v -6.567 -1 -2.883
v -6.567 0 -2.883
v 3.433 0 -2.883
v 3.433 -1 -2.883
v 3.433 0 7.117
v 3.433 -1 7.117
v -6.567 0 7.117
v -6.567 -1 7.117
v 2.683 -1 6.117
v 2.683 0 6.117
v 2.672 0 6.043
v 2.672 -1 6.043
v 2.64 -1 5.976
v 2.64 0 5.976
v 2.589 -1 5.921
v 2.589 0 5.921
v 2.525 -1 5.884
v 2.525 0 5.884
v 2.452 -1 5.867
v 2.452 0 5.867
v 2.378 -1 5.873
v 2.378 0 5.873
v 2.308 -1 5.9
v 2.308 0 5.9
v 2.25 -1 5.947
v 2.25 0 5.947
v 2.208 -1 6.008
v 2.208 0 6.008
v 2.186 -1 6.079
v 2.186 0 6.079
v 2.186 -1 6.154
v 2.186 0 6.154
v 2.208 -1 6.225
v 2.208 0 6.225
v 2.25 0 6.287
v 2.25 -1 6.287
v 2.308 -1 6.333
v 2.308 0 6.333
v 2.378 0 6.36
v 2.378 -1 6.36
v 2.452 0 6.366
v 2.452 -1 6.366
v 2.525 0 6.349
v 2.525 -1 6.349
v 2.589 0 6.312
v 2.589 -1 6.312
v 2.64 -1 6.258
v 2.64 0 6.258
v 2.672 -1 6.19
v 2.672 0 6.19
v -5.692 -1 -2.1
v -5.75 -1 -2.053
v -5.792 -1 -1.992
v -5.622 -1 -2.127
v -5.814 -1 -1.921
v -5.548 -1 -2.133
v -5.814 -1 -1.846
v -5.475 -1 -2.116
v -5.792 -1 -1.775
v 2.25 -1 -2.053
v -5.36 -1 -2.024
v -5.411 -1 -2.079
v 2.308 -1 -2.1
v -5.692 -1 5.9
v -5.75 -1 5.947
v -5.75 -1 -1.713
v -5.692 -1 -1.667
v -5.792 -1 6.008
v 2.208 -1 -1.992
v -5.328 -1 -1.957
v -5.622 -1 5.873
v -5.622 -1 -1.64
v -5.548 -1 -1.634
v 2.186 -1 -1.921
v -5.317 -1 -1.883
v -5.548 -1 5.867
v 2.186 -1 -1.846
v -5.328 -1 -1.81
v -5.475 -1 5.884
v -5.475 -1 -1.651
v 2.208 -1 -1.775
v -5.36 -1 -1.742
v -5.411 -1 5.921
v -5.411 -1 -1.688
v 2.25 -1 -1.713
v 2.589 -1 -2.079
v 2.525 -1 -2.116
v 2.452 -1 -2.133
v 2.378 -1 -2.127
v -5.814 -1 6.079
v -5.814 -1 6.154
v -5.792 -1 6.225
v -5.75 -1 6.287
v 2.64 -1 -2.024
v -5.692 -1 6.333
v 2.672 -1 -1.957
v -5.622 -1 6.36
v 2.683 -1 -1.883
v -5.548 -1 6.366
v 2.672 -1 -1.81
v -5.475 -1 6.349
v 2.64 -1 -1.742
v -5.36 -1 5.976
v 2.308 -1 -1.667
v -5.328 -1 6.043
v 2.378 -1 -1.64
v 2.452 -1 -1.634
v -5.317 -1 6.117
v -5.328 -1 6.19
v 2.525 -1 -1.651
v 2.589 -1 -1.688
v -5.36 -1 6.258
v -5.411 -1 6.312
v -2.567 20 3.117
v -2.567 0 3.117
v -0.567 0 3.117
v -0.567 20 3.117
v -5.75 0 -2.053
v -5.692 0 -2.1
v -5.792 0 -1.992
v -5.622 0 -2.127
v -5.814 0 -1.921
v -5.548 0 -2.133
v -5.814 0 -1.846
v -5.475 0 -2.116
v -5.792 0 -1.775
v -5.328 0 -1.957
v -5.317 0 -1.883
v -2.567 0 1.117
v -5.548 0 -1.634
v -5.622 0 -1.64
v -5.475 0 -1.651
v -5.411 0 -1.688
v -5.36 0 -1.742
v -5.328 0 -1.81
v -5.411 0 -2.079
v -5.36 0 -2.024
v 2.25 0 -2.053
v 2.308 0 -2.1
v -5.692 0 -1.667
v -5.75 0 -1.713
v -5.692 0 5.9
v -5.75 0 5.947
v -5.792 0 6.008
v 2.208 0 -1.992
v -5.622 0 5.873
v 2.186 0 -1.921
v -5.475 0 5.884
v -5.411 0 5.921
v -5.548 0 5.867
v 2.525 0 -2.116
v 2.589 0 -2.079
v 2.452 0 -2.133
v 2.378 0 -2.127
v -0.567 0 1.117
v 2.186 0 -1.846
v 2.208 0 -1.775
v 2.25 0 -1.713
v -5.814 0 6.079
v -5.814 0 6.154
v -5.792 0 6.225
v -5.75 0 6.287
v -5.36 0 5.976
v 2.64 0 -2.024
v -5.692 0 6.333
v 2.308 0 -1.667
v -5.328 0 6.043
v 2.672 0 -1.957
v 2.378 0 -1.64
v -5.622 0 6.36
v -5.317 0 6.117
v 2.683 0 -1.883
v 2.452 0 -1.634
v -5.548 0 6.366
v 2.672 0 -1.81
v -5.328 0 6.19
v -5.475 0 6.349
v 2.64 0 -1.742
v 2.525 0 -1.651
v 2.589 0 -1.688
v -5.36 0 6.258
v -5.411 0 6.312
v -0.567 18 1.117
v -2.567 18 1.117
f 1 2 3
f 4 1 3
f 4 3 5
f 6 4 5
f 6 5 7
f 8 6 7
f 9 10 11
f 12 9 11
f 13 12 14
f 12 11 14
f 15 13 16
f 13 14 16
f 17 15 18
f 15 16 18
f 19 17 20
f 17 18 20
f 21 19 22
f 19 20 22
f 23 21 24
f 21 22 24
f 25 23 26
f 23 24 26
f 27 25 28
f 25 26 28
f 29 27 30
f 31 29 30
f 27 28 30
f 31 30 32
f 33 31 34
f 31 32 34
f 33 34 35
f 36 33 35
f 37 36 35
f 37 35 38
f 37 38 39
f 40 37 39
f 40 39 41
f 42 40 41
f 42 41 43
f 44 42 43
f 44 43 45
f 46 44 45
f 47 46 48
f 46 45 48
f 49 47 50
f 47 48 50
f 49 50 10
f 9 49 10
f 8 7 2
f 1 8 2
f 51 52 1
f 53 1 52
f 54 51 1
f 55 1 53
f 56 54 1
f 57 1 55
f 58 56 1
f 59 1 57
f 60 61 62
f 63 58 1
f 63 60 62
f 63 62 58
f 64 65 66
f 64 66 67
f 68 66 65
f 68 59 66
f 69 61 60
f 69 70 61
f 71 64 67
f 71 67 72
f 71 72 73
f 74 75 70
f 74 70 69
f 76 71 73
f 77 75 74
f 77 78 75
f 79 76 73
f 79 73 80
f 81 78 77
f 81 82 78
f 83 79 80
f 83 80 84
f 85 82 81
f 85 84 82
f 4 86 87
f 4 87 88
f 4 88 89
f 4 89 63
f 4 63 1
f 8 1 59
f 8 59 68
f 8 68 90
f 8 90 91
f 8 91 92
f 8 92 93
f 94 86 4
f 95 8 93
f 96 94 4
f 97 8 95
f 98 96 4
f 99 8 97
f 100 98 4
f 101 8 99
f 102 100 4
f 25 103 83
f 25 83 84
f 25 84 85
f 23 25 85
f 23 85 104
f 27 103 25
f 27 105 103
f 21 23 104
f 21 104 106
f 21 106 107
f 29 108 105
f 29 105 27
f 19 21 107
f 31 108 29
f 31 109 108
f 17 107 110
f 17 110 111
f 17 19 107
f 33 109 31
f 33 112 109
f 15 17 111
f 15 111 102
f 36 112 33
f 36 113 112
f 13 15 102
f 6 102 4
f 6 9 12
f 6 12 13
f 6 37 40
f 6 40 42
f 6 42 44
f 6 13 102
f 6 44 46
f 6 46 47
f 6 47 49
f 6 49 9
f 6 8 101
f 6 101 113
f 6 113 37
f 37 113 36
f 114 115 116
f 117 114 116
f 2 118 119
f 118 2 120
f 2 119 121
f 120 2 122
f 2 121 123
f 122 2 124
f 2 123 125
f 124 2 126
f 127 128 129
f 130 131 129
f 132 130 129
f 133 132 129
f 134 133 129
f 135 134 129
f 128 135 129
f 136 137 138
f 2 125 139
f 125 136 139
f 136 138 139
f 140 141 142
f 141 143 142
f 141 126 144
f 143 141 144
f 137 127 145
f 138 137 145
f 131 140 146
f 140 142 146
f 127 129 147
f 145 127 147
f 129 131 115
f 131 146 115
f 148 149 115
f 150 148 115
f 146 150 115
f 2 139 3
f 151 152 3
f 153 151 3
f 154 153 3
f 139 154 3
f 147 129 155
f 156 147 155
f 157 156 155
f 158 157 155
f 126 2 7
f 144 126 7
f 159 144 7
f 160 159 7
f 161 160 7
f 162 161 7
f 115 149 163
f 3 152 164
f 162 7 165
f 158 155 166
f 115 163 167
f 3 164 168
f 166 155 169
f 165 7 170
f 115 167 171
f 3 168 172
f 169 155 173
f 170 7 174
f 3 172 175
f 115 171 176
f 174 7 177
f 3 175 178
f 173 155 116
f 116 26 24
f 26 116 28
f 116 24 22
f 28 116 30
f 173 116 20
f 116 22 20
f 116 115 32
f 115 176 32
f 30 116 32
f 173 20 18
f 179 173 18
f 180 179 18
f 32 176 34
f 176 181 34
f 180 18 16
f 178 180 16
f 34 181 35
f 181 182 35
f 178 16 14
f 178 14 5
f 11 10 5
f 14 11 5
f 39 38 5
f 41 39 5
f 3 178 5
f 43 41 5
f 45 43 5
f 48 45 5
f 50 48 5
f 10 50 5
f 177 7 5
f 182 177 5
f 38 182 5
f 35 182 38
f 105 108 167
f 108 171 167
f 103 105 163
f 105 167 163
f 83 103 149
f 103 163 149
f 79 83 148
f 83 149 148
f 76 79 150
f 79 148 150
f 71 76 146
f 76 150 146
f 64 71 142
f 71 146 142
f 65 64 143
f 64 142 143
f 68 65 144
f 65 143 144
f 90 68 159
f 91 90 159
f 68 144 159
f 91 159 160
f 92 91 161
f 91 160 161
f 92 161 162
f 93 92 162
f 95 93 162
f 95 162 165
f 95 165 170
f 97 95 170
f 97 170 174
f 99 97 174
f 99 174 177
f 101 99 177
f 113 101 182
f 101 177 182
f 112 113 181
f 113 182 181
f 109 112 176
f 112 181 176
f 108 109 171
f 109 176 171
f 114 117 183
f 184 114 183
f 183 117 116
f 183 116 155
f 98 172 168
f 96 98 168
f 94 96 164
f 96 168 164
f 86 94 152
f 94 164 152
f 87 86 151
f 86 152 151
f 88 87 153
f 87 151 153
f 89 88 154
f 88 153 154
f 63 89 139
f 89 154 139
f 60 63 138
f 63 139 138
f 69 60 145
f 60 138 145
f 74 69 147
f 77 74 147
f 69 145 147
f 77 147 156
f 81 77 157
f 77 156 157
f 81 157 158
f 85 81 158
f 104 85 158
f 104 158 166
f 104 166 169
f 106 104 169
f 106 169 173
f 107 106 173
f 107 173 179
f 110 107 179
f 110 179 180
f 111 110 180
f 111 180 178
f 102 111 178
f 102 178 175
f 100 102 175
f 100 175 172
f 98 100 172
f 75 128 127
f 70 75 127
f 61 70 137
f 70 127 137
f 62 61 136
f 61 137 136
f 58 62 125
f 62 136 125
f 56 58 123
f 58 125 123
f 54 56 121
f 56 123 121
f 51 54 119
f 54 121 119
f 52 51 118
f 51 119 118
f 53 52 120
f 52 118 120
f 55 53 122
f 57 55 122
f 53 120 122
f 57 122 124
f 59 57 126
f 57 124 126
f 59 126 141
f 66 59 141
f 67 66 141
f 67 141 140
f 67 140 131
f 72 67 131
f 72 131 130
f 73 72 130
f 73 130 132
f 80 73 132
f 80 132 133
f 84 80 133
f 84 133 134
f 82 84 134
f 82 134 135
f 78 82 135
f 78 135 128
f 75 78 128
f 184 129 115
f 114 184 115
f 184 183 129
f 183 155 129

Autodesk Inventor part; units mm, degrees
ref_plane "YZ Plane" through (0, 0, 0) normal (1, 0, 0) x (0, 1, 0)
ref_plane "XZ Plane" through (0, 0, 0) normal (0, 1, 0) x (-1, 0, 0)
ref_plane "XY Plane" through (0, 0, 0) normal (0, 0, 1) x (1, 0, 0)
sketch "Sketch2" plane through (0, 0, 0) normal (0, 1, 0) x (-1, 0, 0)
  line L0 (2.5667, 3.1167) -> (0.5667, 3.1167)
  line L1 (0.5667, 3.1167) -> (0.5667, 1.1167)
  line L2 (0.5667, 1.1167) -> (2.5667, 1.1167)
  line L3 (2.5667, 1.1167) -> (2.5667, 3.1167)
  point P0 (0, 0)
  dimension "d5" = 2
  dimension "d6" = 2
extrude "Extrusion1" add sketch "Sketch2" along normal blind 20
sketch "Sketch3" plane through (-0.5667, 0, 3.1167) normal (1, 0, 0) x (0, 0, -1)
  line L0 (0, 20) -> (2, 20) projected
  line L1 (0, 20) -> (2, 18)
  line L2 (2, 0) -> (2, 20) projected
  line L3 (0, 20) -> (2.8284, 20) construction
  point P0 (3.1167, 0)
  dimension "d9" = 45
extrude "Extrusion2" cut sketch "Sketch3" against normal through all
sketch "Sketch4" plane through (0, 0, 0) normal (0, -1, 0) x (1, 0, 0)
  line L0 (3.4333, 7.1167) -> (-6.5667, 7.1167)
  line L1 (-6.5667, 7.1167) -> (-6.5667, -2.8833)
  line L2 (-6.5667, -2.8833) -> (3.4333, -2.8833)
  line L3 (3.4333, -2.8833) -> (3.4333, 7.1167)
  line L4 (-2.5667, 1.1167) -> (-2.5667, 3.1167) projected
  line L5 (-0.5667, 1.1167) -> (-2.5667, 1.1167) projected
  point P0 (0, 0)
  dimension "d12" = 10
  dimension "d13" = 10
  dimension "d14" = 4
  dimension "d15" = 4
extrude "Extrusion3" add sketch "Sketch4" along normal blind 1
sketch "Sketch5" plane through (0, 0, 0) normal (0, 1, 0) x (1, 0, 0)
  circle A0 centre (-5.5667, 1.8833) radius 0.25
  line L0 (-6.5667, -7.1167) -> (-6.5667, 2.8833) projected
  line L1 (3.4333, 2.8833) -> (3.4333, -7.1167) projected
  line L2 (-6.5667, 2.8833) -> (3.4333, 2.8833) projected
  circle A1 centre (-5.5667, -6.1167) radius 0.25
  circle A2 centre (2.4333, 1.8833) radius 0.25
  circle A3 centre (2.4333, -6.1167) radius 0.25
  point P0 (0, 0)
  dimension "d18" = 0.5
  dimension "d20" = 9
  dimension "d22" = 1
  dimension "d25" = 8
  dimension "d28" = 8
extrude "Extrusion4" cut sketch "Sketch5" against normal through all
properties part number "Viewing Mirror Holder"
